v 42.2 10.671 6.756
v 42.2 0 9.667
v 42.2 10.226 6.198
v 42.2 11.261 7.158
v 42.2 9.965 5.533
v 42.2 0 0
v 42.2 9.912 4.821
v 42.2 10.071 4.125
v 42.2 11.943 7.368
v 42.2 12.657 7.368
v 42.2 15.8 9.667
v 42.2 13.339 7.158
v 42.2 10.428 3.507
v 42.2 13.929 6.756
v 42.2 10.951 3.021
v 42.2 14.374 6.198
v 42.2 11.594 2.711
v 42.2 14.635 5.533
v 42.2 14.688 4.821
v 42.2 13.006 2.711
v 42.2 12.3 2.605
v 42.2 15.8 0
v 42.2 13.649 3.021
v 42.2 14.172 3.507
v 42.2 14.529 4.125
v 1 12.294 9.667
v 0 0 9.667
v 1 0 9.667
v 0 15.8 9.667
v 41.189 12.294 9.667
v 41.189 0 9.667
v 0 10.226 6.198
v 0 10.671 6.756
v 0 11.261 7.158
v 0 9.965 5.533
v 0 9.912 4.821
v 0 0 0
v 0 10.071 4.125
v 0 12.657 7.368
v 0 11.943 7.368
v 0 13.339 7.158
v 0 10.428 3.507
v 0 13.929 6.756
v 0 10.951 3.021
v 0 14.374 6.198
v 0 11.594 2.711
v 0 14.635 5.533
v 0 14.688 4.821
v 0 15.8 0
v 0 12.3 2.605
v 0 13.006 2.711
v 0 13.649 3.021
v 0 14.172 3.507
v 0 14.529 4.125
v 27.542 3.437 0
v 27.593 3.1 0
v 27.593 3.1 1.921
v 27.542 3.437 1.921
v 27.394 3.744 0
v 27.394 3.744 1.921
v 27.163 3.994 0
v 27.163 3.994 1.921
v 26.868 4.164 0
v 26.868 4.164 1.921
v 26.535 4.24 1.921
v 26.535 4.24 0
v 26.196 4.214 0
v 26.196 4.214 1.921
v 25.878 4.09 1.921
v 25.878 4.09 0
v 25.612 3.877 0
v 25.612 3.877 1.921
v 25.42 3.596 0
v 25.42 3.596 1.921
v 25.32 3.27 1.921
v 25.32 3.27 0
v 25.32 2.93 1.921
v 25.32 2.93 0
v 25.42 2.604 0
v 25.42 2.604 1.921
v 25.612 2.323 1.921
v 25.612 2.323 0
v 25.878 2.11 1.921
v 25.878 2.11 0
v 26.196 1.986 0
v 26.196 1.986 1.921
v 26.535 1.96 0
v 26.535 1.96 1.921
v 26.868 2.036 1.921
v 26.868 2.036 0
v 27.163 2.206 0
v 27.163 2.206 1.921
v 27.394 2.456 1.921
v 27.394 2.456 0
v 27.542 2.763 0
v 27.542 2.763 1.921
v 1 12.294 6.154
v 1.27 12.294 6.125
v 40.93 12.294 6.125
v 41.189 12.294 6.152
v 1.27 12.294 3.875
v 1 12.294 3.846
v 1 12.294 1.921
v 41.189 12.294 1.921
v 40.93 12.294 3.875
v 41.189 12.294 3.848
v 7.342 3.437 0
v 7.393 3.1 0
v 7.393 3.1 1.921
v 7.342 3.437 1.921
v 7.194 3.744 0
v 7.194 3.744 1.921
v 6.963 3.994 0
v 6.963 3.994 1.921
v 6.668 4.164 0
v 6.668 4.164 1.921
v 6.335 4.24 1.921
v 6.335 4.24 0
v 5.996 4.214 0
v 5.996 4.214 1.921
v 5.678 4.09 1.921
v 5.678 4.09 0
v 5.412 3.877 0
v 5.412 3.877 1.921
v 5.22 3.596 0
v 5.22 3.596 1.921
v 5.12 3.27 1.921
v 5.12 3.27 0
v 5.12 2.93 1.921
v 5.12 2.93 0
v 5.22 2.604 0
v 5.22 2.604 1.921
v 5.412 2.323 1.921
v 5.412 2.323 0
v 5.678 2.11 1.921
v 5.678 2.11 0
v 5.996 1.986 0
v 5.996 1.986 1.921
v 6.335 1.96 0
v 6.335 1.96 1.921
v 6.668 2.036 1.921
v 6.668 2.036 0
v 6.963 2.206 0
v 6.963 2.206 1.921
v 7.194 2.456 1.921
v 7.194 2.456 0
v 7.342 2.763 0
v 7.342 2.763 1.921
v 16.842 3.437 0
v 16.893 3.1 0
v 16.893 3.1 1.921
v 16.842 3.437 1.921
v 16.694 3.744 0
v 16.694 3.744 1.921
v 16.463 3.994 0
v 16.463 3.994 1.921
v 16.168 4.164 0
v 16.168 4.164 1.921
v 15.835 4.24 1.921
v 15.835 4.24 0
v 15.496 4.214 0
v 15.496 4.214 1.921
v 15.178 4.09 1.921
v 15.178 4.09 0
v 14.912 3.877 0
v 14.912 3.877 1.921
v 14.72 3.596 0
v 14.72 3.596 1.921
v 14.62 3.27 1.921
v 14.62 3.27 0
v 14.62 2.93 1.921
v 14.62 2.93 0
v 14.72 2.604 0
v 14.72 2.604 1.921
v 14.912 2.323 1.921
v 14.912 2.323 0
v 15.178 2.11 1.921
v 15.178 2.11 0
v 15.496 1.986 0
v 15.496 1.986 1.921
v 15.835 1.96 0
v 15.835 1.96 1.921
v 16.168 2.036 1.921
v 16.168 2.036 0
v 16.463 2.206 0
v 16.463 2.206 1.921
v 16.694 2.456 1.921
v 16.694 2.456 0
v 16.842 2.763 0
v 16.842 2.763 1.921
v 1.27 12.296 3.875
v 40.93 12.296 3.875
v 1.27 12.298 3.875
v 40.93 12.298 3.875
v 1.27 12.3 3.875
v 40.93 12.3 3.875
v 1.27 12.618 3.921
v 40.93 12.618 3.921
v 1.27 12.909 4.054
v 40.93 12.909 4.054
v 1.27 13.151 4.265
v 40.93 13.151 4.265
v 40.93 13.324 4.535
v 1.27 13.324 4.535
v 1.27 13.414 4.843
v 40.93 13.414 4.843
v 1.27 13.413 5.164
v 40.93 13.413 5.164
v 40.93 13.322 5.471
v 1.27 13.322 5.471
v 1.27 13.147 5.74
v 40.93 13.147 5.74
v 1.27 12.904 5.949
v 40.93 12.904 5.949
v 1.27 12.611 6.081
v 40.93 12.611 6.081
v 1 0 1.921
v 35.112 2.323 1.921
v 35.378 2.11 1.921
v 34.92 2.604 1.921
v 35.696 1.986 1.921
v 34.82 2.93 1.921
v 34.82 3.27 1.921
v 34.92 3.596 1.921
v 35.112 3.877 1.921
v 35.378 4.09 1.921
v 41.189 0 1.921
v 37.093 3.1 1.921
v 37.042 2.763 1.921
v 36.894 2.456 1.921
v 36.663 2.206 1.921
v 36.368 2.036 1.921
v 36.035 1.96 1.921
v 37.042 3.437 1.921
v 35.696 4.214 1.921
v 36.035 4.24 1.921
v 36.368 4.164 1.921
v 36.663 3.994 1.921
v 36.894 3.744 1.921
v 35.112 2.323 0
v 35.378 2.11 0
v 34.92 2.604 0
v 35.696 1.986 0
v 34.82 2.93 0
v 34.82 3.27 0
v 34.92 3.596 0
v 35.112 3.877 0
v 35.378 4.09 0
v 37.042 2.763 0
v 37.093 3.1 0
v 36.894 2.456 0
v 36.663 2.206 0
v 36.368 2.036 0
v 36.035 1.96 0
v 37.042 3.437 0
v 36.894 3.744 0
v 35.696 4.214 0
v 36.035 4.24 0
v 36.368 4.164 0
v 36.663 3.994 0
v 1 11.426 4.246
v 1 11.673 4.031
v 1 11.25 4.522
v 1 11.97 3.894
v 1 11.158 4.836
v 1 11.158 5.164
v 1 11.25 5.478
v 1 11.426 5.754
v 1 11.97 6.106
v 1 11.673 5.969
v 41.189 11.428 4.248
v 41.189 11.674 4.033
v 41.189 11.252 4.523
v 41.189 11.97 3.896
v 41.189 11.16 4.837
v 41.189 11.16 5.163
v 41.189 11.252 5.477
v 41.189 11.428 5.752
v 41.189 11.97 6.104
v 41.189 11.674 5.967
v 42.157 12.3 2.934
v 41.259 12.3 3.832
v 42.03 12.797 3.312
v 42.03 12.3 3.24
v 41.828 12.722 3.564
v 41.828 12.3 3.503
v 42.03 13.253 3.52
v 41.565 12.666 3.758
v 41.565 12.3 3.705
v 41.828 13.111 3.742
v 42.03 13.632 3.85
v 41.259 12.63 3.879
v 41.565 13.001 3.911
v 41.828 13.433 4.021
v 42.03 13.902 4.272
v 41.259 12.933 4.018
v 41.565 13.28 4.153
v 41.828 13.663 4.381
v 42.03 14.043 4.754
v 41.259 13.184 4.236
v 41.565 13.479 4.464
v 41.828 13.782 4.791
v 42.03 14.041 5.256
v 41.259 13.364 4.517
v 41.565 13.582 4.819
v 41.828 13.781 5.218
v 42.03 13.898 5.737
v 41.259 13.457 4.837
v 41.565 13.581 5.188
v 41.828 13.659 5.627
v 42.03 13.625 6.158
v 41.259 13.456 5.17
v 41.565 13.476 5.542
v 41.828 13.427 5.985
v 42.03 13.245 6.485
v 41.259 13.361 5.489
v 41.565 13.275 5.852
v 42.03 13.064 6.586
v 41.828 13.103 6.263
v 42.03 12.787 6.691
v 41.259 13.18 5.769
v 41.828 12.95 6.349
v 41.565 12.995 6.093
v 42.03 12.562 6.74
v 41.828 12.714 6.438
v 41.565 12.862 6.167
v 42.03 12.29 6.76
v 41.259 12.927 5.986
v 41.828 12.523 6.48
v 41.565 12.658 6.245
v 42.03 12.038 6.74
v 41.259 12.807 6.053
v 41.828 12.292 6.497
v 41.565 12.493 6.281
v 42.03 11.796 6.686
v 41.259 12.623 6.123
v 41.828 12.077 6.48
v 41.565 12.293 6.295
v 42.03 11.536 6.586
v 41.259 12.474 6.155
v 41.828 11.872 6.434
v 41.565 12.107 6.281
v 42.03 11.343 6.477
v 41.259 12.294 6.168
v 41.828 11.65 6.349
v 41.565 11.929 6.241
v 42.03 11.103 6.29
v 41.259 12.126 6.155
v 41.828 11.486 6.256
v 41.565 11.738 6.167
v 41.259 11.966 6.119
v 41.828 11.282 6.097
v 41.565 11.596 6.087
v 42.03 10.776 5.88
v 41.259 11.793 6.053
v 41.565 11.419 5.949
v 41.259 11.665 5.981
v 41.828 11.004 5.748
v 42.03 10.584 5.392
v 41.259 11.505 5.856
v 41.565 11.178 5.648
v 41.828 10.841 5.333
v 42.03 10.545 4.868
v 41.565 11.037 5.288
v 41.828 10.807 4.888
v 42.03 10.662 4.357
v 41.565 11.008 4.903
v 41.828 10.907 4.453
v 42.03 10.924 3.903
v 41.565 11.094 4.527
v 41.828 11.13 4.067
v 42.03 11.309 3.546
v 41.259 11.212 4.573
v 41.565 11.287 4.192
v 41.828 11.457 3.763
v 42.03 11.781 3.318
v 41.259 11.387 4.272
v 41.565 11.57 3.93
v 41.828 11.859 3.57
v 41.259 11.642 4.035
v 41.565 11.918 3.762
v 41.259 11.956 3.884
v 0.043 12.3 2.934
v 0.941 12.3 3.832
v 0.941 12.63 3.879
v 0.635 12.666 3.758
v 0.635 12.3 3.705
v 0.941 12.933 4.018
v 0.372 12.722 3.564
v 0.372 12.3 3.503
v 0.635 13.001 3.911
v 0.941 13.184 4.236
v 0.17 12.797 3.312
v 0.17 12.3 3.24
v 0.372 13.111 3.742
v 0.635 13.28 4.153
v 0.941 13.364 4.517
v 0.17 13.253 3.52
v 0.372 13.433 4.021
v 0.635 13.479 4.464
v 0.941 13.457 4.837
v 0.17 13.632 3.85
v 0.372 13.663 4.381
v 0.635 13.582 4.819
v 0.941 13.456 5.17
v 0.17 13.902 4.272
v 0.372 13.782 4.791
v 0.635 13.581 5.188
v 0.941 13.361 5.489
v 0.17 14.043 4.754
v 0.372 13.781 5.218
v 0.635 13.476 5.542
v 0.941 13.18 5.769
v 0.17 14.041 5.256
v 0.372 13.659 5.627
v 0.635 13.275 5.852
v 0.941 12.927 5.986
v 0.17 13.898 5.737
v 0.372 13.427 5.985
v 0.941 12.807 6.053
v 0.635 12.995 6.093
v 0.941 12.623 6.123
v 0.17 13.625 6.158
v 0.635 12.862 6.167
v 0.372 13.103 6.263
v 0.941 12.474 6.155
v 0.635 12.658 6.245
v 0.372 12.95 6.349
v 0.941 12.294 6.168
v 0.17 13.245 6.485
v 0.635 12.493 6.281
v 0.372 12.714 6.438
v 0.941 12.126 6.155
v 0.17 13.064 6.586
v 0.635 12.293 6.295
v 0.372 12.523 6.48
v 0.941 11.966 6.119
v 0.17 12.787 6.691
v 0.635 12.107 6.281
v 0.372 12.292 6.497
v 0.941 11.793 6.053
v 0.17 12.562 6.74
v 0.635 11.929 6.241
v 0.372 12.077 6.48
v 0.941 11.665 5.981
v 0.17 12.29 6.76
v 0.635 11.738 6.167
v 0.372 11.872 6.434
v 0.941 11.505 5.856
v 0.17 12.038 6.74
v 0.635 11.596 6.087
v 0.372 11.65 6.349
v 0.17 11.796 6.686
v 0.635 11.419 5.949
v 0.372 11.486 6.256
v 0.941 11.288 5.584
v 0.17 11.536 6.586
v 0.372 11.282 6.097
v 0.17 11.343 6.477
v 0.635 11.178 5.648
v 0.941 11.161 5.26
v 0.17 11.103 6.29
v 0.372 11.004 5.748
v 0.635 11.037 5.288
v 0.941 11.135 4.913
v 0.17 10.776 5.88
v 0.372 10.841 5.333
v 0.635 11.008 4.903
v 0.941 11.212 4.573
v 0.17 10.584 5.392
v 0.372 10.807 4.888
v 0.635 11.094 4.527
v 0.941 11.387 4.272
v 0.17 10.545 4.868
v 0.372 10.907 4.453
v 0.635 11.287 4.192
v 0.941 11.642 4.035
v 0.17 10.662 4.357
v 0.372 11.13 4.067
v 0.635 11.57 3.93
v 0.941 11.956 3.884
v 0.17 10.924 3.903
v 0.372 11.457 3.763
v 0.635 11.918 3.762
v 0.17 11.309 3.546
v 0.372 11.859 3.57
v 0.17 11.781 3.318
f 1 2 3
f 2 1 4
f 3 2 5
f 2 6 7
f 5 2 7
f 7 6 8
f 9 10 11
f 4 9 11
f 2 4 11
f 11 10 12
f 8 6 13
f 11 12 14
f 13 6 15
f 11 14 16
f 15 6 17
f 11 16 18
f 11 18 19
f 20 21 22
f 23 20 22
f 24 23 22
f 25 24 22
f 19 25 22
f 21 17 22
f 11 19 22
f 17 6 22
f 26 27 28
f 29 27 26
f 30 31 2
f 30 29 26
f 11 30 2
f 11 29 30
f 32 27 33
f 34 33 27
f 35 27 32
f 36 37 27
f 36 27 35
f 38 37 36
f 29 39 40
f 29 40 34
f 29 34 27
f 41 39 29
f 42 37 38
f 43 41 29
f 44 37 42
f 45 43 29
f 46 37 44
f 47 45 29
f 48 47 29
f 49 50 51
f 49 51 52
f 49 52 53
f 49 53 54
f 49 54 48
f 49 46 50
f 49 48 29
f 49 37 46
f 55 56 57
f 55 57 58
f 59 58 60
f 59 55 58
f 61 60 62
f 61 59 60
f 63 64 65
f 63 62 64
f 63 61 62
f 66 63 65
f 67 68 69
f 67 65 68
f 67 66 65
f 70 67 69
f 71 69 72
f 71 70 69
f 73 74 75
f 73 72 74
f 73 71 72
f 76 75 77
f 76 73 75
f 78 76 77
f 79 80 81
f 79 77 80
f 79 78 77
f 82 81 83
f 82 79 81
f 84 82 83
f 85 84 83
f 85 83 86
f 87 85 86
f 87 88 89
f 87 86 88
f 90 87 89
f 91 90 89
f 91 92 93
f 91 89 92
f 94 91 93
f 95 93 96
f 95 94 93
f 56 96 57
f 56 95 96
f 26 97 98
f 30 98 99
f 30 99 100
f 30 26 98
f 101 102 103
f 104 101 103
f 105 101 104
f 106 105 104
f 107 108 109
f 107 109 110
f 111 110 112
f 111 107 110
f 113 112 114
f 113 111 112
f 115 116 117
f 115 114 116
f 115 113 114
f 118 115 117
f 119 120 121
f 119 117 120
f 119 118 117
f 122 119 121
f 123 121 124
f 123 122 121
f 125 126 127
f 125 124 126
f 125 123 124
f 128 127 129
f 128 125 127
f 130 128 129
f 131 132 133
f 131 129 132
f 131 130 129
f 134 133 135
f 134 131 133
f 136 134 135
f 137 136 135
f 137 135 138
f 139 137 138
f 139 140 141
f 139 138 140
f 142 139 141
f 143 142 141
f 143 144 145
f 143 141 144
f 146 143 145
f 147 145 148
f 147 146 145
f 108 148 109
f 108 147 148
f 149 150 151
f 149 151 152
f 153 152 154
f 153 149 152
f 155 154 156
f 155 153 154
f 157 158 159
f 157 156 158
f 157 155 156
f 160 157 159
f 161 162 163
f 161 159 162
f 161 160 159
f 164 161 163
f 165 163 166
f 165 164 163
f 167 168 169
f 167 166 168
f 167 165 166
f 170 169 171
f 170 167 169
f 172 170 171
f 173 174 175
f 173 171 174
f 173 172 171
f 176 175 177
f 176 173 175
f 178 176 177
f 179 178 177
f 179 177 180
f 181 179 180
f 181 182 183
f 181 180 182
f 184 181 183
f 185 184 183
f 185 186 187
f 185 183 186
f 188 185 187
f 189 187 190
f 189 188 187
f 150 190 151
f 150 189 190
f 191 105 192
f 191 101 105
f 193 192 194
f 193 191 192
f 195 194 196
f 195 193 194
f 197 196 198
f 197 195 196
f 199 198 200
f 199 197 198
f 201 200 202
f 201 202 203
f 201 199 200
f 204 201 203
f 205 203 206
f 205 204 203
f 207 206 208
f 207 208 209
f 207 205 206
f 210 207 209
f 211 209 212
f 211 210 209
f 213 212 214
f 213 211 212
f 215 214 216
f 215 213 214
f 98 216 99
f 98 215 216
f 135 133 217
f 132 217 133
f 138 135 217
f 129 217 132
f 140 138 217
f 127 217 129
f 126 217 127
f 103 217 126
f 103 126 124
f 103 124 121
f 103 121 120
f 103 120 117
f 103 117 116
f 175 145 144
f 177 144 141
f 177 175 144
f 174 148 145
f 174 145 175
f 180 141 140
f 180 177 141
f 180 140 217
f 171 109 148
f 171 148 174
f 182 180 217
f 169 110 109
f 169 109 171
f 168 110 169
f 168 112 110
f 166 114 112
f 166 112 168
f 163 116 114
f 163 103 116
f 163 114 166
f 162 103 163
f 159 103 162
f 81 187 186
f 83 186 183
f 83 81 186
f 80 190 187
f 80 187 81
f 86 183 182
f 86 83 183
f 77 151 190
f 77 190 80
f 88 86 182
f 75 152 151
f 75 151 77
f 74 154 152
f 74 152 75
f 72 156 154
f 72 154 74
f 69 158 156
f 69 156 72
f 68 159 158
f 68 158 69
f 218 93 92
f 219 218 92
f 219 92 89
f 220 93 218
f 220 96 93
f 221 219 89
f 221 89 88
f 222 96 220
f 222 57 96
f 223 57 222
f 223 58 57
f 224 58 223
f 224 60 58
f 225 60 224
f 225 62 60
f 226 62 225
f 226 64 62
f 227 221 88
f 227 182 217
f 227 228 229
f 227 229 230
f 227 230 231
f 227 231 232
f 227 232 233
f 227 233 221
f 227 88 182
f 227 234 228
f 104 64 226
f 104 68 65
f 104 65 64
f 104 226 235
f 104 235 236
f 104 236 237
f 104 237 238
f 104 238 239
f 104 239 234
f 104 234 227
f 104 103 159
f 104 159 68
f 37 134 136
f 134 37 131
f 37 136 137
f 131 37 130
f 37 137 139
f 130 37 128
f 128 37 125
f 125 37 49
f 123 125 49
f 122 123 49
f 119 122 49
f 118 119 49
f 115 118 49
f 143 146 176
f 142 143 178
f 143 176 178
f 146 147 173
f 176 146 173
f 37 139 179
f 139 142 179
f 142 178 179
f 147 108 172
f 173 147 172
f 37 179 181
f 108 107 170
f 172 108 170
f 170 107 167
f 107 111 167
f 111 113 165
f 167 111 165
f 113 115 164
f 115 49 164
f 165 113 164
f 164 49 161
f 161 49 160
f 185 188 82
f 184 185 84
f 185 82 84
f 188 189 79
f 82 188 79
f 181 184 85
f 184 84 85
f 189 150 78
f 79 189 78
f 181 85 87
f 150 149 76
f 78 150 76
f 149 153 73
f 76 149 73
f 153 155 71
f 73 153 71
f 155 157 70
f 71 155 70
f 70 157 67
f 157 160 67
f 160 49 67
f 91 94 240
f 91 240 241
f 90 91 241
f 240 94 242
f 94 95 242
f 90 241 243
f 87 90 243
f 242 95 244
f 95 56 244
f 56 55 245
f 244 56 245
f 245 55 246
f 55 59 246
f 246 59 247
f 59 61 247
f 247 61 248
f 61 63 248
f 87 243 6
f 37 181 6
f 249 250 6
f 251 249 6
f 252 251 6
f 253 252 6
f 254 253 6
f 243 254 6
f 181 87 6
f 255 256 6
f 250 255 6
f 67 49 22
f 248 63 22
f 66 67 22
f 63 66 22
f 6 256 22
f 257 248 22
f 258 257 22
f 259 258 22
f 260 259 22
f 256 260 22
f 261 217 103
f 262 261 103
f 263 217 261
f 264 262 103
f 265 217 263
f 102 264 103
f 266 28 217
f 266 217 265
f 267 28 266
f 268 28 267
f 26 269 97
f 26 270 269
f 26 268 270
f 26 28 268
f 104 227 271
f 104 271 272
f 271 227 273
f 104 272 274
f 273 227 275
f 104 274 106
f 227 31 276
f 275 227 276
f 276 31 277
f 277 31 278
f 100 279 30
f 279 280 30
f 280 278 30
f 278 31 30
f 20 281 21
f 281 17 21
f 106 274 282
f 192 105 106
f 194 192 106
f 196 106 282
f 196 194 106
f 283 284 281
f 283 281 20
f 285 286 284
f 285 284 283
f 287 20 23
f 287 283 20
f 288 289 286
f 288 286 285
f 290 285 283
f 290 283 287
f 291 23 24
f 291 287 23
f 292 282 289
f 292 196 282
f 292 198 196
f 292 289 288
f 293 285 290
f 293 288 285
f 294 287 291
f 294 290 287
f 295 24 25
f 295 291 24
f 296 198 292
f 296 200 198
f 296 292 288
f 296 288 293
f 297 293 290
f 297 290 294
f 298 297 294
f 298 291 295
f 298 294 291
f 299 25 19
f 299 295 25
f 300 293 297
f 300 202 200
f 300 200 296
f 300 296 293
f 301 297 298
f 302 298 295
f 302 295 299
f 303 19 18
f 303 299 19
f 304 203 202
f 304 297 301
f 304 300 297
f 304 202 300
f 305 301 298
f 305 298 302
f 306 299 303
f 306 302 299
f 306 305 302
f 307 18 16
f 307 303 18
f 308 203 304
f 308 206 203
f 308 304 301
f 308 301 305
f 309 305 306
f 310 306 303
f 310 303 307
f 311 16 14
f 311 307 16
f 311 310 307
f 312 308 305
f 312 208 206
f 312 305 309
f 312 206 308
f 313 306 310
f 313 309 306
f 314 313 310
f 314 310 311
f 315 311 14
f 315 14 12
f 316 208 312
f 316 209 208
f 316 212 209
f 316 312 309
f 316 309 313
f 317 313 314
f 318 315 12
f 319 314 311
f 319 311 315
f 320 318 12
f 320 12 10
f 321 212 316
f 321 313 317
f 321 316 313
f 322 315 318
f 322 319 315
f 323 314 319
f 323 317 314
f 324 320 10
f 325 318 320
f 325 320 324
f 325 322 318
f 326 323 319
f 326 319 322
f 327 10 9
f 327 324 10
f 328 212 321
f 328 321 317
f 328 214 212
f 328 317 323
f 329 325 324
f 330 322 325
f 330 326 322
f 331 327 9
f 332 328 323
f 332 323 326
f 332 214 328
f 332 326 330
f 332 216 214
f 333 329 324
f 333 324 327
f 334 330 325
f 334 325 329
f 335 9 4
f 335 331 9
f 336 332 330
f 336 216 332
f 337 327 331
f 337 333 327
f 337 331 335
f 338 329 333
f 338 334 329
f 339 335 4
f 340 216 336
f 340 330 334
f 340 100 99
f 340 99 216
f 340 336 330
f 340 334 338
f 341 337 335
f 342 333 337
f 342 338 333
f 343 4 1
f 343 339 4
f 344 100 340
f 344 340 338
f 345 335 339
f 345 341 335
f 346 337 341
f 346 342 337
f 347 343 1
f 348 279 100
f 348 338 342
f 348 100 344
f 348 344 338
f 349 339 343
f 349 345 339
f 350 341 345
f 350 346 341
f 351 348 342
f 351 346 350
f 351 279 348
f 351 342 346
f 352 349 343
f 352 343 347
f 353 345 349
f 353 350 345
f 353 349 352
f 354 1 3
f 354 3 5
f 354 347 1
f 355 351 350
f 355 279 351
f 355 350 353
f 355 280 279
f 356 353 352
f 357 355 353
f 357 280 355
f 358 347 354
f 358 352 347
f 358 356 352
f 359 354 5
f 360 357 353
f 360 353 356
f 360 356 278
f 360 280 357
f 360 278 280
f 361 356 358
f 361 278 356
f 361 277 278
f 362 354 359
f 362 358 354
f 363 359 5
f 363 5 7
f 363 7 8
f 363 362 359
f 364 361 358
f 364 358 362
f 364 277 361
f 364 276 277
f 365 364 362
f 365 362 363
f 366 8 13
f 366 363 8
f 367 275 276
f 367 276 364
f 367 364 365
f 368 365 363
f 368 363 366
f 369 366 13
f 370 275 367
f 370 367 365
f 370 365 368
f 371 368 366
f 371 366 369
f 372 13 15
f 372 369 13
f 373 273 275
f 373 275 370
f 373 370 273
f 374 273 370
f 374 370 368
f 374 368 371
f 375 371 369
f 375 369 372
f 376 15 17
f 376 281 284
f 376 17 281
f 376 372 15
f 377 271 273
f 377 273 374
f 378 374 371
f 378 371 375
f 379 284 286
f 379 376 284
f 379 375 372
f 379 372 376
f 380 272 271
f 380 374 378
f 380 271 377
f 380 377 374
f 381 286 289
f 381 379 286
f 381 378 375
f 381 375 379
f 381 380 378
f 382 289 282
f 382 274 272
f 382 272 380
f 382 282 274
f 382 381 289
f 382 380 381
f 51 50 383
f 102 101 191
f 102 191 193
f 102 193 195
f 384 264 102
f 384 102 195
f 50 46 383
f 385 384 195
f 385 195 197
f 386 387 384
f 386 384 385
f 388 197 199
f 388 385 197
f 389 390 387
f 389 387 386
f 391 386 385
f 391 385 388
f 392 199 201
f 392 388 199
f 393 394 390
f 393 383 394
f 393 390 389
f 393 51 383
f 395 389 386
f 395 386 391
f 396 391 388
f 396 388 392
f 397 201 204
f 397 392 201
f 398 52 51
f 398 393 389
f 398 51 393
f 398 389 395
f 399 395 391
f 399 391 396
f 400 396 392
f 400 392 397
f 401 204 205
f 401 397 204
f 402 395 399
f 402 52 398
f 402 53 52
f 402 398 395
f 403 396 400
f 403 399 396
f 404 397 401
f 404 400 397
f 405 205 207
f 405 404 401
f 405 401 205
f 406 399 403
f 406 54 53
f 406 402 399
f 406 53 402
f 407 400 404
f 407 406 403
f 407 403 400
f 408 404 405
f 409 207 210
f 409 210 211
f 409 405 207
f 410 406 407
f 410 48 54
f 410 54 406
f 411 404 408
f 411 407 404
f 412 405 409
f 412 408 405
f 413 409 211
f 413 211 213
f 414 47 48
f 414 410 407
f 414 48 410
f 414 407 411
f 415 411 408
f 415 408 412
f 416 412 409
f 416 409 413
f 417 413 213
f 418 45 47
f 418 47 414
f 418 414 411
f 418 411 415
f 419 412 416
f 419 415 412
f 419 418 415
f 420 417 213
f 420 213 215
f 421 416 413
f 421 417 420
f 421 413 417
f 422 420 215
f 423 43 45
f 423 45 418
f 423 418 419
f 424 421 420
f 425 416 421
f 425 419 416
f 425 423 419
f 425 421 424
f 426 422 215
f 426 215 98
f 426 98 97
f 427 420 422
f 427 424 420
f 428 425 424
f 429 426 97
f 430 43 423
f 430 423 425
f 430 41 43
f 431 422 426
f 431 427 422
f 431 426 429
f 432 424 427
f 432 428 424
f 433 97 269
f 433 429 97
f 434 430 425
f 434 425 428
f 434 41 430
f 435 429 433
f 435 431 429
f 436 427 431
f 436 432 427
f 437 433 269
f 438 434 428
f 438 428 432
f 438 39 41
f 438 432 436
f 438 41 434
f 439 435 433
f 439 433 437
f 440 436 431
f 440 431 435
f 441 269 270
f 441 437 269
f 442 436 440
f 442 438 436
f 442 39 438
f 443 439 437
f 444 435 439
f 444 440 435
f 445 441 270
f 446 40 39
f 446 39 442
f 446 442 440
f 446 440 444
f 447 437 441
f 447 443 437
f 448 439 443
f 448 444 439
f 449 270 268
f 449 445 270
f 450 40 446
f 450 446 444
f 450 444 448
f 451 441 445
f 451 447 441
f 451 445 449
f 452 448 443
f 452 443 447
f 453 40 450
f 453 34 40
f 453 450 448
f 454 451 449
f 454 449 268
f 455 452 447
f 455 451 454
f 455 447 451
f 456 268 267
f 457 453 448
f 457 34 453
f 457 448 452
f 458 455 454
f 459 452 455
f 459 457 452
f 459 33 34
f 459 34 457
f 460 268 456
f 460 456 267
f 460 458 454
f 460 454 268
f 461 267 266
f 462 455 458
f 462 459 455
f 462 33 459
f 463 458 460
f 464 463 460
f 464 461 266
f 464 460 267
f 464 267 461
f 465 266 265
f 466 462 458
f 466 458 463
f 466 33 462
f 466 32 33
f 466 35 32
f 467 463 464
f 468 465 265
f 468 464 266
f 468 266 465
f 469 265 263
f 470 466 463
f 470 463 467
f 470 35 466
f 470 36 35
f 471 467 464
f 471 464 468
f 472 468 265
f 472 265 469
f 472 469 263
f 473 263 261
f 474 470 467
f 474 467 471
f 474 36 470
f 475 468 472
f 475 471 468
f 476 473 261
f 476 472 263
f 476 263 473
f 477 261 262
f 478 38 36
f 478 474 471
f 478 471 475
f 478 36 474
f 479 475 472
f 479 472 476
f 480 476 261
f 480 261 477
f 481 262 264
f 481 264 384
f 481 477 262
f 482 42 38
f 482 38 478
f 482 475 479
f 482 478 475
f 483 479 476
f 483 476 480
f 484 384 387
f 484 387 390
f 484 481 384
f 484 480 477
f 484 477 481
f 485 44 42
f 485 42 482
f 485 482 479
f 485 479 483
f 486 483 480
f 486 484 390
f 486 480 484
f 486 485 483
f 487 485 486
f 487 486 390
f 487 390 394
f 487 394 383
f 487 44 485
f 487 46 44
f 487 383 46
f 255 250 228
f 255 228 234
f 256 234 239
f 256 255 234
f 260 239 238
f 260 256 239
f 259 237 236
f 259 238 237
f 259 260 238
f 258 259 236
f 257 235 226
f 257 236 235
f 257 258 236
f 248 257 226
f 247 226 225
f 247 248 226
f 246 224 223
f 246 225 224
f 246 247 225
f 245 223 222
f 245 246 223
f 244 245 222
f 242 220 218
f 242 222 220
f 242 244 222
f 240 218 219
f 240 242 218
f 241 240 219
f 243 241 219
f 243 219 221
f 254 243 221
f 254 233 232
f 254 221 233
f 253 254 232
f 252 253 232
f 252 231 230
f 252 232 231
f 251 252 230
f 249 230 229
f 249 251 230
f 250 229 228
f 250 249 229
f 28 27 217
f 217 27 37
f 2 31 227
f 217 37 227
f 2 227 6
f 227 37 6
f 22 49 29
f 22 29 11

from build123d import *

# Parameters (mm, degrees)
SKETCH1_W               = 42.2
SKETCH1_H               = 15.8
BOSS_EXTRUDE1_DEPTH     = 9.666666667
CUT_EXTRUDE1_DEPTH      = 47.086054772
CUT_EXTRUDE1_DEPTH_BACK = 47.086054772
SKETCH2_R               = 1.125
SKETCH3_W               = 40.1894
SKETCH3_H               = 12.2936
CUT_EXTRUDE3_DEPTH      = 7.745557598
FILLET1_R               = 1.27
CUT_EXTRUDE4_DEPTH      = 46.721698049
CUT_EXTRUDE4_DEPTH_BACK = 46.721698049
SKETCH4_R               = 1.143


with BuildPart() as part:
    # Sketch1 → Boss-Extrude1 (new body)
    with BuildSketch(Plane.XY):
        with Locations((21.1, 7.9)):
            Rectangle(SKETCH1_W, SKETCH1_H)
    extrude(amount=BOSS_EXTRUDE1_DEPTH)

    # Sketch2 → Cut-Extrude1 (cut, two sides: drawn at the far end of the back side and taken through both)
    with BuildSketch(Plane(origin=(42.2, 0, 0), x_dir=(0, 0, -1), z_dir=(1, 0, 0)).offset(-CUT_EXTRUDE1_DEPTH_BACK)):
        with Locations((-5, 12.3)):
            Circle(SKETCH2_R)
    extrude(amount=CUT_EXTRUDE1_DEPTH + CUT_EXTRUDE1_DEPTH_BACK, mode=Mode.SUBTRACT)

    # Sketch3 → Cut-Extrude3 (cut)
    with BuildSketch(Plane.XY.offset(9.666666667)):
        with Locations((21.0947, 6.1468)):
            Rectangle(SKETCH3_W, SKETCH3_H)
    extrude(amount=-CUT_EXTRUDE3_DEPTH, mode=Mode.SUBTRACT)

    # Fillet1
    # the kernel refuses this fillet: 1.27 mm, written as the material it takes off along each edge
    with BuildSketch(Plane(origin=(0, 12.3, 5), x_dir=(0, 0, -1), z_dir=(0, -1, 0))) as fillet1_piece_1:
        with BuildLine():
            CenterArc((1.125 + FILLET1_R, FILLET1_R), FILLET1_R, 180, 90)
            Line((1.125, FILLET1_R), (1.125, 0))
            Line((1.125, 0), (1.125 + FILLET1_R, 0))
        make_face()
    revolve(axis=Axis((0, 12.3, 5), (1, 0, 0)), mode=Mode.SUBTRACT)
    with BuildSketch(Plane(origin=(42.2, 12.3, 5), x_dir=(0, 0, -1), z_dir=(0, -1, 0))) as fillet1_piece_2:
        with BuildLine():
            CenterArc((1.125 + FILLET1_R, -FILLET1_R), FILLET1_R, 90, 90)
            Line((1.125, -FILLET1_R), (1.125, 0))
            Line((1.125, 0), (1.125 + FILLET1_R, 0))
        make_face()
    revolve(axis=Axis((42.2, 12.3, 5), (1, 0, 0)), mode=Mode.SUBTRACT)

    # Sketch4 → Cut-Extrude4 (cut, two sides: drawn at the far end of the back side and taken through both)
    with BuildSketch(Plane.XY.offset(1.921109069).offset(-CUT_EXTRUDE4_DEPTH_BACK)):
        with Locations((6.25, 3.1)):
            Circle(SKETCH4_R)
        with Locations((15.75, 3.1)):
            Circle(SKETCH4_R)
        with Locations((26.45, 3.1)):
            Circle(SKETCH4_R)
        with Locations((35.95, 3.1)):
            Circle(SKETCH4_R)
    extrude(amount=CUT_EXTRUDE4_DEPTH + CUT_EXTRUDE4_DEPTH_BACK, mode=Mode.SUBTRACT)


solid = part.part
